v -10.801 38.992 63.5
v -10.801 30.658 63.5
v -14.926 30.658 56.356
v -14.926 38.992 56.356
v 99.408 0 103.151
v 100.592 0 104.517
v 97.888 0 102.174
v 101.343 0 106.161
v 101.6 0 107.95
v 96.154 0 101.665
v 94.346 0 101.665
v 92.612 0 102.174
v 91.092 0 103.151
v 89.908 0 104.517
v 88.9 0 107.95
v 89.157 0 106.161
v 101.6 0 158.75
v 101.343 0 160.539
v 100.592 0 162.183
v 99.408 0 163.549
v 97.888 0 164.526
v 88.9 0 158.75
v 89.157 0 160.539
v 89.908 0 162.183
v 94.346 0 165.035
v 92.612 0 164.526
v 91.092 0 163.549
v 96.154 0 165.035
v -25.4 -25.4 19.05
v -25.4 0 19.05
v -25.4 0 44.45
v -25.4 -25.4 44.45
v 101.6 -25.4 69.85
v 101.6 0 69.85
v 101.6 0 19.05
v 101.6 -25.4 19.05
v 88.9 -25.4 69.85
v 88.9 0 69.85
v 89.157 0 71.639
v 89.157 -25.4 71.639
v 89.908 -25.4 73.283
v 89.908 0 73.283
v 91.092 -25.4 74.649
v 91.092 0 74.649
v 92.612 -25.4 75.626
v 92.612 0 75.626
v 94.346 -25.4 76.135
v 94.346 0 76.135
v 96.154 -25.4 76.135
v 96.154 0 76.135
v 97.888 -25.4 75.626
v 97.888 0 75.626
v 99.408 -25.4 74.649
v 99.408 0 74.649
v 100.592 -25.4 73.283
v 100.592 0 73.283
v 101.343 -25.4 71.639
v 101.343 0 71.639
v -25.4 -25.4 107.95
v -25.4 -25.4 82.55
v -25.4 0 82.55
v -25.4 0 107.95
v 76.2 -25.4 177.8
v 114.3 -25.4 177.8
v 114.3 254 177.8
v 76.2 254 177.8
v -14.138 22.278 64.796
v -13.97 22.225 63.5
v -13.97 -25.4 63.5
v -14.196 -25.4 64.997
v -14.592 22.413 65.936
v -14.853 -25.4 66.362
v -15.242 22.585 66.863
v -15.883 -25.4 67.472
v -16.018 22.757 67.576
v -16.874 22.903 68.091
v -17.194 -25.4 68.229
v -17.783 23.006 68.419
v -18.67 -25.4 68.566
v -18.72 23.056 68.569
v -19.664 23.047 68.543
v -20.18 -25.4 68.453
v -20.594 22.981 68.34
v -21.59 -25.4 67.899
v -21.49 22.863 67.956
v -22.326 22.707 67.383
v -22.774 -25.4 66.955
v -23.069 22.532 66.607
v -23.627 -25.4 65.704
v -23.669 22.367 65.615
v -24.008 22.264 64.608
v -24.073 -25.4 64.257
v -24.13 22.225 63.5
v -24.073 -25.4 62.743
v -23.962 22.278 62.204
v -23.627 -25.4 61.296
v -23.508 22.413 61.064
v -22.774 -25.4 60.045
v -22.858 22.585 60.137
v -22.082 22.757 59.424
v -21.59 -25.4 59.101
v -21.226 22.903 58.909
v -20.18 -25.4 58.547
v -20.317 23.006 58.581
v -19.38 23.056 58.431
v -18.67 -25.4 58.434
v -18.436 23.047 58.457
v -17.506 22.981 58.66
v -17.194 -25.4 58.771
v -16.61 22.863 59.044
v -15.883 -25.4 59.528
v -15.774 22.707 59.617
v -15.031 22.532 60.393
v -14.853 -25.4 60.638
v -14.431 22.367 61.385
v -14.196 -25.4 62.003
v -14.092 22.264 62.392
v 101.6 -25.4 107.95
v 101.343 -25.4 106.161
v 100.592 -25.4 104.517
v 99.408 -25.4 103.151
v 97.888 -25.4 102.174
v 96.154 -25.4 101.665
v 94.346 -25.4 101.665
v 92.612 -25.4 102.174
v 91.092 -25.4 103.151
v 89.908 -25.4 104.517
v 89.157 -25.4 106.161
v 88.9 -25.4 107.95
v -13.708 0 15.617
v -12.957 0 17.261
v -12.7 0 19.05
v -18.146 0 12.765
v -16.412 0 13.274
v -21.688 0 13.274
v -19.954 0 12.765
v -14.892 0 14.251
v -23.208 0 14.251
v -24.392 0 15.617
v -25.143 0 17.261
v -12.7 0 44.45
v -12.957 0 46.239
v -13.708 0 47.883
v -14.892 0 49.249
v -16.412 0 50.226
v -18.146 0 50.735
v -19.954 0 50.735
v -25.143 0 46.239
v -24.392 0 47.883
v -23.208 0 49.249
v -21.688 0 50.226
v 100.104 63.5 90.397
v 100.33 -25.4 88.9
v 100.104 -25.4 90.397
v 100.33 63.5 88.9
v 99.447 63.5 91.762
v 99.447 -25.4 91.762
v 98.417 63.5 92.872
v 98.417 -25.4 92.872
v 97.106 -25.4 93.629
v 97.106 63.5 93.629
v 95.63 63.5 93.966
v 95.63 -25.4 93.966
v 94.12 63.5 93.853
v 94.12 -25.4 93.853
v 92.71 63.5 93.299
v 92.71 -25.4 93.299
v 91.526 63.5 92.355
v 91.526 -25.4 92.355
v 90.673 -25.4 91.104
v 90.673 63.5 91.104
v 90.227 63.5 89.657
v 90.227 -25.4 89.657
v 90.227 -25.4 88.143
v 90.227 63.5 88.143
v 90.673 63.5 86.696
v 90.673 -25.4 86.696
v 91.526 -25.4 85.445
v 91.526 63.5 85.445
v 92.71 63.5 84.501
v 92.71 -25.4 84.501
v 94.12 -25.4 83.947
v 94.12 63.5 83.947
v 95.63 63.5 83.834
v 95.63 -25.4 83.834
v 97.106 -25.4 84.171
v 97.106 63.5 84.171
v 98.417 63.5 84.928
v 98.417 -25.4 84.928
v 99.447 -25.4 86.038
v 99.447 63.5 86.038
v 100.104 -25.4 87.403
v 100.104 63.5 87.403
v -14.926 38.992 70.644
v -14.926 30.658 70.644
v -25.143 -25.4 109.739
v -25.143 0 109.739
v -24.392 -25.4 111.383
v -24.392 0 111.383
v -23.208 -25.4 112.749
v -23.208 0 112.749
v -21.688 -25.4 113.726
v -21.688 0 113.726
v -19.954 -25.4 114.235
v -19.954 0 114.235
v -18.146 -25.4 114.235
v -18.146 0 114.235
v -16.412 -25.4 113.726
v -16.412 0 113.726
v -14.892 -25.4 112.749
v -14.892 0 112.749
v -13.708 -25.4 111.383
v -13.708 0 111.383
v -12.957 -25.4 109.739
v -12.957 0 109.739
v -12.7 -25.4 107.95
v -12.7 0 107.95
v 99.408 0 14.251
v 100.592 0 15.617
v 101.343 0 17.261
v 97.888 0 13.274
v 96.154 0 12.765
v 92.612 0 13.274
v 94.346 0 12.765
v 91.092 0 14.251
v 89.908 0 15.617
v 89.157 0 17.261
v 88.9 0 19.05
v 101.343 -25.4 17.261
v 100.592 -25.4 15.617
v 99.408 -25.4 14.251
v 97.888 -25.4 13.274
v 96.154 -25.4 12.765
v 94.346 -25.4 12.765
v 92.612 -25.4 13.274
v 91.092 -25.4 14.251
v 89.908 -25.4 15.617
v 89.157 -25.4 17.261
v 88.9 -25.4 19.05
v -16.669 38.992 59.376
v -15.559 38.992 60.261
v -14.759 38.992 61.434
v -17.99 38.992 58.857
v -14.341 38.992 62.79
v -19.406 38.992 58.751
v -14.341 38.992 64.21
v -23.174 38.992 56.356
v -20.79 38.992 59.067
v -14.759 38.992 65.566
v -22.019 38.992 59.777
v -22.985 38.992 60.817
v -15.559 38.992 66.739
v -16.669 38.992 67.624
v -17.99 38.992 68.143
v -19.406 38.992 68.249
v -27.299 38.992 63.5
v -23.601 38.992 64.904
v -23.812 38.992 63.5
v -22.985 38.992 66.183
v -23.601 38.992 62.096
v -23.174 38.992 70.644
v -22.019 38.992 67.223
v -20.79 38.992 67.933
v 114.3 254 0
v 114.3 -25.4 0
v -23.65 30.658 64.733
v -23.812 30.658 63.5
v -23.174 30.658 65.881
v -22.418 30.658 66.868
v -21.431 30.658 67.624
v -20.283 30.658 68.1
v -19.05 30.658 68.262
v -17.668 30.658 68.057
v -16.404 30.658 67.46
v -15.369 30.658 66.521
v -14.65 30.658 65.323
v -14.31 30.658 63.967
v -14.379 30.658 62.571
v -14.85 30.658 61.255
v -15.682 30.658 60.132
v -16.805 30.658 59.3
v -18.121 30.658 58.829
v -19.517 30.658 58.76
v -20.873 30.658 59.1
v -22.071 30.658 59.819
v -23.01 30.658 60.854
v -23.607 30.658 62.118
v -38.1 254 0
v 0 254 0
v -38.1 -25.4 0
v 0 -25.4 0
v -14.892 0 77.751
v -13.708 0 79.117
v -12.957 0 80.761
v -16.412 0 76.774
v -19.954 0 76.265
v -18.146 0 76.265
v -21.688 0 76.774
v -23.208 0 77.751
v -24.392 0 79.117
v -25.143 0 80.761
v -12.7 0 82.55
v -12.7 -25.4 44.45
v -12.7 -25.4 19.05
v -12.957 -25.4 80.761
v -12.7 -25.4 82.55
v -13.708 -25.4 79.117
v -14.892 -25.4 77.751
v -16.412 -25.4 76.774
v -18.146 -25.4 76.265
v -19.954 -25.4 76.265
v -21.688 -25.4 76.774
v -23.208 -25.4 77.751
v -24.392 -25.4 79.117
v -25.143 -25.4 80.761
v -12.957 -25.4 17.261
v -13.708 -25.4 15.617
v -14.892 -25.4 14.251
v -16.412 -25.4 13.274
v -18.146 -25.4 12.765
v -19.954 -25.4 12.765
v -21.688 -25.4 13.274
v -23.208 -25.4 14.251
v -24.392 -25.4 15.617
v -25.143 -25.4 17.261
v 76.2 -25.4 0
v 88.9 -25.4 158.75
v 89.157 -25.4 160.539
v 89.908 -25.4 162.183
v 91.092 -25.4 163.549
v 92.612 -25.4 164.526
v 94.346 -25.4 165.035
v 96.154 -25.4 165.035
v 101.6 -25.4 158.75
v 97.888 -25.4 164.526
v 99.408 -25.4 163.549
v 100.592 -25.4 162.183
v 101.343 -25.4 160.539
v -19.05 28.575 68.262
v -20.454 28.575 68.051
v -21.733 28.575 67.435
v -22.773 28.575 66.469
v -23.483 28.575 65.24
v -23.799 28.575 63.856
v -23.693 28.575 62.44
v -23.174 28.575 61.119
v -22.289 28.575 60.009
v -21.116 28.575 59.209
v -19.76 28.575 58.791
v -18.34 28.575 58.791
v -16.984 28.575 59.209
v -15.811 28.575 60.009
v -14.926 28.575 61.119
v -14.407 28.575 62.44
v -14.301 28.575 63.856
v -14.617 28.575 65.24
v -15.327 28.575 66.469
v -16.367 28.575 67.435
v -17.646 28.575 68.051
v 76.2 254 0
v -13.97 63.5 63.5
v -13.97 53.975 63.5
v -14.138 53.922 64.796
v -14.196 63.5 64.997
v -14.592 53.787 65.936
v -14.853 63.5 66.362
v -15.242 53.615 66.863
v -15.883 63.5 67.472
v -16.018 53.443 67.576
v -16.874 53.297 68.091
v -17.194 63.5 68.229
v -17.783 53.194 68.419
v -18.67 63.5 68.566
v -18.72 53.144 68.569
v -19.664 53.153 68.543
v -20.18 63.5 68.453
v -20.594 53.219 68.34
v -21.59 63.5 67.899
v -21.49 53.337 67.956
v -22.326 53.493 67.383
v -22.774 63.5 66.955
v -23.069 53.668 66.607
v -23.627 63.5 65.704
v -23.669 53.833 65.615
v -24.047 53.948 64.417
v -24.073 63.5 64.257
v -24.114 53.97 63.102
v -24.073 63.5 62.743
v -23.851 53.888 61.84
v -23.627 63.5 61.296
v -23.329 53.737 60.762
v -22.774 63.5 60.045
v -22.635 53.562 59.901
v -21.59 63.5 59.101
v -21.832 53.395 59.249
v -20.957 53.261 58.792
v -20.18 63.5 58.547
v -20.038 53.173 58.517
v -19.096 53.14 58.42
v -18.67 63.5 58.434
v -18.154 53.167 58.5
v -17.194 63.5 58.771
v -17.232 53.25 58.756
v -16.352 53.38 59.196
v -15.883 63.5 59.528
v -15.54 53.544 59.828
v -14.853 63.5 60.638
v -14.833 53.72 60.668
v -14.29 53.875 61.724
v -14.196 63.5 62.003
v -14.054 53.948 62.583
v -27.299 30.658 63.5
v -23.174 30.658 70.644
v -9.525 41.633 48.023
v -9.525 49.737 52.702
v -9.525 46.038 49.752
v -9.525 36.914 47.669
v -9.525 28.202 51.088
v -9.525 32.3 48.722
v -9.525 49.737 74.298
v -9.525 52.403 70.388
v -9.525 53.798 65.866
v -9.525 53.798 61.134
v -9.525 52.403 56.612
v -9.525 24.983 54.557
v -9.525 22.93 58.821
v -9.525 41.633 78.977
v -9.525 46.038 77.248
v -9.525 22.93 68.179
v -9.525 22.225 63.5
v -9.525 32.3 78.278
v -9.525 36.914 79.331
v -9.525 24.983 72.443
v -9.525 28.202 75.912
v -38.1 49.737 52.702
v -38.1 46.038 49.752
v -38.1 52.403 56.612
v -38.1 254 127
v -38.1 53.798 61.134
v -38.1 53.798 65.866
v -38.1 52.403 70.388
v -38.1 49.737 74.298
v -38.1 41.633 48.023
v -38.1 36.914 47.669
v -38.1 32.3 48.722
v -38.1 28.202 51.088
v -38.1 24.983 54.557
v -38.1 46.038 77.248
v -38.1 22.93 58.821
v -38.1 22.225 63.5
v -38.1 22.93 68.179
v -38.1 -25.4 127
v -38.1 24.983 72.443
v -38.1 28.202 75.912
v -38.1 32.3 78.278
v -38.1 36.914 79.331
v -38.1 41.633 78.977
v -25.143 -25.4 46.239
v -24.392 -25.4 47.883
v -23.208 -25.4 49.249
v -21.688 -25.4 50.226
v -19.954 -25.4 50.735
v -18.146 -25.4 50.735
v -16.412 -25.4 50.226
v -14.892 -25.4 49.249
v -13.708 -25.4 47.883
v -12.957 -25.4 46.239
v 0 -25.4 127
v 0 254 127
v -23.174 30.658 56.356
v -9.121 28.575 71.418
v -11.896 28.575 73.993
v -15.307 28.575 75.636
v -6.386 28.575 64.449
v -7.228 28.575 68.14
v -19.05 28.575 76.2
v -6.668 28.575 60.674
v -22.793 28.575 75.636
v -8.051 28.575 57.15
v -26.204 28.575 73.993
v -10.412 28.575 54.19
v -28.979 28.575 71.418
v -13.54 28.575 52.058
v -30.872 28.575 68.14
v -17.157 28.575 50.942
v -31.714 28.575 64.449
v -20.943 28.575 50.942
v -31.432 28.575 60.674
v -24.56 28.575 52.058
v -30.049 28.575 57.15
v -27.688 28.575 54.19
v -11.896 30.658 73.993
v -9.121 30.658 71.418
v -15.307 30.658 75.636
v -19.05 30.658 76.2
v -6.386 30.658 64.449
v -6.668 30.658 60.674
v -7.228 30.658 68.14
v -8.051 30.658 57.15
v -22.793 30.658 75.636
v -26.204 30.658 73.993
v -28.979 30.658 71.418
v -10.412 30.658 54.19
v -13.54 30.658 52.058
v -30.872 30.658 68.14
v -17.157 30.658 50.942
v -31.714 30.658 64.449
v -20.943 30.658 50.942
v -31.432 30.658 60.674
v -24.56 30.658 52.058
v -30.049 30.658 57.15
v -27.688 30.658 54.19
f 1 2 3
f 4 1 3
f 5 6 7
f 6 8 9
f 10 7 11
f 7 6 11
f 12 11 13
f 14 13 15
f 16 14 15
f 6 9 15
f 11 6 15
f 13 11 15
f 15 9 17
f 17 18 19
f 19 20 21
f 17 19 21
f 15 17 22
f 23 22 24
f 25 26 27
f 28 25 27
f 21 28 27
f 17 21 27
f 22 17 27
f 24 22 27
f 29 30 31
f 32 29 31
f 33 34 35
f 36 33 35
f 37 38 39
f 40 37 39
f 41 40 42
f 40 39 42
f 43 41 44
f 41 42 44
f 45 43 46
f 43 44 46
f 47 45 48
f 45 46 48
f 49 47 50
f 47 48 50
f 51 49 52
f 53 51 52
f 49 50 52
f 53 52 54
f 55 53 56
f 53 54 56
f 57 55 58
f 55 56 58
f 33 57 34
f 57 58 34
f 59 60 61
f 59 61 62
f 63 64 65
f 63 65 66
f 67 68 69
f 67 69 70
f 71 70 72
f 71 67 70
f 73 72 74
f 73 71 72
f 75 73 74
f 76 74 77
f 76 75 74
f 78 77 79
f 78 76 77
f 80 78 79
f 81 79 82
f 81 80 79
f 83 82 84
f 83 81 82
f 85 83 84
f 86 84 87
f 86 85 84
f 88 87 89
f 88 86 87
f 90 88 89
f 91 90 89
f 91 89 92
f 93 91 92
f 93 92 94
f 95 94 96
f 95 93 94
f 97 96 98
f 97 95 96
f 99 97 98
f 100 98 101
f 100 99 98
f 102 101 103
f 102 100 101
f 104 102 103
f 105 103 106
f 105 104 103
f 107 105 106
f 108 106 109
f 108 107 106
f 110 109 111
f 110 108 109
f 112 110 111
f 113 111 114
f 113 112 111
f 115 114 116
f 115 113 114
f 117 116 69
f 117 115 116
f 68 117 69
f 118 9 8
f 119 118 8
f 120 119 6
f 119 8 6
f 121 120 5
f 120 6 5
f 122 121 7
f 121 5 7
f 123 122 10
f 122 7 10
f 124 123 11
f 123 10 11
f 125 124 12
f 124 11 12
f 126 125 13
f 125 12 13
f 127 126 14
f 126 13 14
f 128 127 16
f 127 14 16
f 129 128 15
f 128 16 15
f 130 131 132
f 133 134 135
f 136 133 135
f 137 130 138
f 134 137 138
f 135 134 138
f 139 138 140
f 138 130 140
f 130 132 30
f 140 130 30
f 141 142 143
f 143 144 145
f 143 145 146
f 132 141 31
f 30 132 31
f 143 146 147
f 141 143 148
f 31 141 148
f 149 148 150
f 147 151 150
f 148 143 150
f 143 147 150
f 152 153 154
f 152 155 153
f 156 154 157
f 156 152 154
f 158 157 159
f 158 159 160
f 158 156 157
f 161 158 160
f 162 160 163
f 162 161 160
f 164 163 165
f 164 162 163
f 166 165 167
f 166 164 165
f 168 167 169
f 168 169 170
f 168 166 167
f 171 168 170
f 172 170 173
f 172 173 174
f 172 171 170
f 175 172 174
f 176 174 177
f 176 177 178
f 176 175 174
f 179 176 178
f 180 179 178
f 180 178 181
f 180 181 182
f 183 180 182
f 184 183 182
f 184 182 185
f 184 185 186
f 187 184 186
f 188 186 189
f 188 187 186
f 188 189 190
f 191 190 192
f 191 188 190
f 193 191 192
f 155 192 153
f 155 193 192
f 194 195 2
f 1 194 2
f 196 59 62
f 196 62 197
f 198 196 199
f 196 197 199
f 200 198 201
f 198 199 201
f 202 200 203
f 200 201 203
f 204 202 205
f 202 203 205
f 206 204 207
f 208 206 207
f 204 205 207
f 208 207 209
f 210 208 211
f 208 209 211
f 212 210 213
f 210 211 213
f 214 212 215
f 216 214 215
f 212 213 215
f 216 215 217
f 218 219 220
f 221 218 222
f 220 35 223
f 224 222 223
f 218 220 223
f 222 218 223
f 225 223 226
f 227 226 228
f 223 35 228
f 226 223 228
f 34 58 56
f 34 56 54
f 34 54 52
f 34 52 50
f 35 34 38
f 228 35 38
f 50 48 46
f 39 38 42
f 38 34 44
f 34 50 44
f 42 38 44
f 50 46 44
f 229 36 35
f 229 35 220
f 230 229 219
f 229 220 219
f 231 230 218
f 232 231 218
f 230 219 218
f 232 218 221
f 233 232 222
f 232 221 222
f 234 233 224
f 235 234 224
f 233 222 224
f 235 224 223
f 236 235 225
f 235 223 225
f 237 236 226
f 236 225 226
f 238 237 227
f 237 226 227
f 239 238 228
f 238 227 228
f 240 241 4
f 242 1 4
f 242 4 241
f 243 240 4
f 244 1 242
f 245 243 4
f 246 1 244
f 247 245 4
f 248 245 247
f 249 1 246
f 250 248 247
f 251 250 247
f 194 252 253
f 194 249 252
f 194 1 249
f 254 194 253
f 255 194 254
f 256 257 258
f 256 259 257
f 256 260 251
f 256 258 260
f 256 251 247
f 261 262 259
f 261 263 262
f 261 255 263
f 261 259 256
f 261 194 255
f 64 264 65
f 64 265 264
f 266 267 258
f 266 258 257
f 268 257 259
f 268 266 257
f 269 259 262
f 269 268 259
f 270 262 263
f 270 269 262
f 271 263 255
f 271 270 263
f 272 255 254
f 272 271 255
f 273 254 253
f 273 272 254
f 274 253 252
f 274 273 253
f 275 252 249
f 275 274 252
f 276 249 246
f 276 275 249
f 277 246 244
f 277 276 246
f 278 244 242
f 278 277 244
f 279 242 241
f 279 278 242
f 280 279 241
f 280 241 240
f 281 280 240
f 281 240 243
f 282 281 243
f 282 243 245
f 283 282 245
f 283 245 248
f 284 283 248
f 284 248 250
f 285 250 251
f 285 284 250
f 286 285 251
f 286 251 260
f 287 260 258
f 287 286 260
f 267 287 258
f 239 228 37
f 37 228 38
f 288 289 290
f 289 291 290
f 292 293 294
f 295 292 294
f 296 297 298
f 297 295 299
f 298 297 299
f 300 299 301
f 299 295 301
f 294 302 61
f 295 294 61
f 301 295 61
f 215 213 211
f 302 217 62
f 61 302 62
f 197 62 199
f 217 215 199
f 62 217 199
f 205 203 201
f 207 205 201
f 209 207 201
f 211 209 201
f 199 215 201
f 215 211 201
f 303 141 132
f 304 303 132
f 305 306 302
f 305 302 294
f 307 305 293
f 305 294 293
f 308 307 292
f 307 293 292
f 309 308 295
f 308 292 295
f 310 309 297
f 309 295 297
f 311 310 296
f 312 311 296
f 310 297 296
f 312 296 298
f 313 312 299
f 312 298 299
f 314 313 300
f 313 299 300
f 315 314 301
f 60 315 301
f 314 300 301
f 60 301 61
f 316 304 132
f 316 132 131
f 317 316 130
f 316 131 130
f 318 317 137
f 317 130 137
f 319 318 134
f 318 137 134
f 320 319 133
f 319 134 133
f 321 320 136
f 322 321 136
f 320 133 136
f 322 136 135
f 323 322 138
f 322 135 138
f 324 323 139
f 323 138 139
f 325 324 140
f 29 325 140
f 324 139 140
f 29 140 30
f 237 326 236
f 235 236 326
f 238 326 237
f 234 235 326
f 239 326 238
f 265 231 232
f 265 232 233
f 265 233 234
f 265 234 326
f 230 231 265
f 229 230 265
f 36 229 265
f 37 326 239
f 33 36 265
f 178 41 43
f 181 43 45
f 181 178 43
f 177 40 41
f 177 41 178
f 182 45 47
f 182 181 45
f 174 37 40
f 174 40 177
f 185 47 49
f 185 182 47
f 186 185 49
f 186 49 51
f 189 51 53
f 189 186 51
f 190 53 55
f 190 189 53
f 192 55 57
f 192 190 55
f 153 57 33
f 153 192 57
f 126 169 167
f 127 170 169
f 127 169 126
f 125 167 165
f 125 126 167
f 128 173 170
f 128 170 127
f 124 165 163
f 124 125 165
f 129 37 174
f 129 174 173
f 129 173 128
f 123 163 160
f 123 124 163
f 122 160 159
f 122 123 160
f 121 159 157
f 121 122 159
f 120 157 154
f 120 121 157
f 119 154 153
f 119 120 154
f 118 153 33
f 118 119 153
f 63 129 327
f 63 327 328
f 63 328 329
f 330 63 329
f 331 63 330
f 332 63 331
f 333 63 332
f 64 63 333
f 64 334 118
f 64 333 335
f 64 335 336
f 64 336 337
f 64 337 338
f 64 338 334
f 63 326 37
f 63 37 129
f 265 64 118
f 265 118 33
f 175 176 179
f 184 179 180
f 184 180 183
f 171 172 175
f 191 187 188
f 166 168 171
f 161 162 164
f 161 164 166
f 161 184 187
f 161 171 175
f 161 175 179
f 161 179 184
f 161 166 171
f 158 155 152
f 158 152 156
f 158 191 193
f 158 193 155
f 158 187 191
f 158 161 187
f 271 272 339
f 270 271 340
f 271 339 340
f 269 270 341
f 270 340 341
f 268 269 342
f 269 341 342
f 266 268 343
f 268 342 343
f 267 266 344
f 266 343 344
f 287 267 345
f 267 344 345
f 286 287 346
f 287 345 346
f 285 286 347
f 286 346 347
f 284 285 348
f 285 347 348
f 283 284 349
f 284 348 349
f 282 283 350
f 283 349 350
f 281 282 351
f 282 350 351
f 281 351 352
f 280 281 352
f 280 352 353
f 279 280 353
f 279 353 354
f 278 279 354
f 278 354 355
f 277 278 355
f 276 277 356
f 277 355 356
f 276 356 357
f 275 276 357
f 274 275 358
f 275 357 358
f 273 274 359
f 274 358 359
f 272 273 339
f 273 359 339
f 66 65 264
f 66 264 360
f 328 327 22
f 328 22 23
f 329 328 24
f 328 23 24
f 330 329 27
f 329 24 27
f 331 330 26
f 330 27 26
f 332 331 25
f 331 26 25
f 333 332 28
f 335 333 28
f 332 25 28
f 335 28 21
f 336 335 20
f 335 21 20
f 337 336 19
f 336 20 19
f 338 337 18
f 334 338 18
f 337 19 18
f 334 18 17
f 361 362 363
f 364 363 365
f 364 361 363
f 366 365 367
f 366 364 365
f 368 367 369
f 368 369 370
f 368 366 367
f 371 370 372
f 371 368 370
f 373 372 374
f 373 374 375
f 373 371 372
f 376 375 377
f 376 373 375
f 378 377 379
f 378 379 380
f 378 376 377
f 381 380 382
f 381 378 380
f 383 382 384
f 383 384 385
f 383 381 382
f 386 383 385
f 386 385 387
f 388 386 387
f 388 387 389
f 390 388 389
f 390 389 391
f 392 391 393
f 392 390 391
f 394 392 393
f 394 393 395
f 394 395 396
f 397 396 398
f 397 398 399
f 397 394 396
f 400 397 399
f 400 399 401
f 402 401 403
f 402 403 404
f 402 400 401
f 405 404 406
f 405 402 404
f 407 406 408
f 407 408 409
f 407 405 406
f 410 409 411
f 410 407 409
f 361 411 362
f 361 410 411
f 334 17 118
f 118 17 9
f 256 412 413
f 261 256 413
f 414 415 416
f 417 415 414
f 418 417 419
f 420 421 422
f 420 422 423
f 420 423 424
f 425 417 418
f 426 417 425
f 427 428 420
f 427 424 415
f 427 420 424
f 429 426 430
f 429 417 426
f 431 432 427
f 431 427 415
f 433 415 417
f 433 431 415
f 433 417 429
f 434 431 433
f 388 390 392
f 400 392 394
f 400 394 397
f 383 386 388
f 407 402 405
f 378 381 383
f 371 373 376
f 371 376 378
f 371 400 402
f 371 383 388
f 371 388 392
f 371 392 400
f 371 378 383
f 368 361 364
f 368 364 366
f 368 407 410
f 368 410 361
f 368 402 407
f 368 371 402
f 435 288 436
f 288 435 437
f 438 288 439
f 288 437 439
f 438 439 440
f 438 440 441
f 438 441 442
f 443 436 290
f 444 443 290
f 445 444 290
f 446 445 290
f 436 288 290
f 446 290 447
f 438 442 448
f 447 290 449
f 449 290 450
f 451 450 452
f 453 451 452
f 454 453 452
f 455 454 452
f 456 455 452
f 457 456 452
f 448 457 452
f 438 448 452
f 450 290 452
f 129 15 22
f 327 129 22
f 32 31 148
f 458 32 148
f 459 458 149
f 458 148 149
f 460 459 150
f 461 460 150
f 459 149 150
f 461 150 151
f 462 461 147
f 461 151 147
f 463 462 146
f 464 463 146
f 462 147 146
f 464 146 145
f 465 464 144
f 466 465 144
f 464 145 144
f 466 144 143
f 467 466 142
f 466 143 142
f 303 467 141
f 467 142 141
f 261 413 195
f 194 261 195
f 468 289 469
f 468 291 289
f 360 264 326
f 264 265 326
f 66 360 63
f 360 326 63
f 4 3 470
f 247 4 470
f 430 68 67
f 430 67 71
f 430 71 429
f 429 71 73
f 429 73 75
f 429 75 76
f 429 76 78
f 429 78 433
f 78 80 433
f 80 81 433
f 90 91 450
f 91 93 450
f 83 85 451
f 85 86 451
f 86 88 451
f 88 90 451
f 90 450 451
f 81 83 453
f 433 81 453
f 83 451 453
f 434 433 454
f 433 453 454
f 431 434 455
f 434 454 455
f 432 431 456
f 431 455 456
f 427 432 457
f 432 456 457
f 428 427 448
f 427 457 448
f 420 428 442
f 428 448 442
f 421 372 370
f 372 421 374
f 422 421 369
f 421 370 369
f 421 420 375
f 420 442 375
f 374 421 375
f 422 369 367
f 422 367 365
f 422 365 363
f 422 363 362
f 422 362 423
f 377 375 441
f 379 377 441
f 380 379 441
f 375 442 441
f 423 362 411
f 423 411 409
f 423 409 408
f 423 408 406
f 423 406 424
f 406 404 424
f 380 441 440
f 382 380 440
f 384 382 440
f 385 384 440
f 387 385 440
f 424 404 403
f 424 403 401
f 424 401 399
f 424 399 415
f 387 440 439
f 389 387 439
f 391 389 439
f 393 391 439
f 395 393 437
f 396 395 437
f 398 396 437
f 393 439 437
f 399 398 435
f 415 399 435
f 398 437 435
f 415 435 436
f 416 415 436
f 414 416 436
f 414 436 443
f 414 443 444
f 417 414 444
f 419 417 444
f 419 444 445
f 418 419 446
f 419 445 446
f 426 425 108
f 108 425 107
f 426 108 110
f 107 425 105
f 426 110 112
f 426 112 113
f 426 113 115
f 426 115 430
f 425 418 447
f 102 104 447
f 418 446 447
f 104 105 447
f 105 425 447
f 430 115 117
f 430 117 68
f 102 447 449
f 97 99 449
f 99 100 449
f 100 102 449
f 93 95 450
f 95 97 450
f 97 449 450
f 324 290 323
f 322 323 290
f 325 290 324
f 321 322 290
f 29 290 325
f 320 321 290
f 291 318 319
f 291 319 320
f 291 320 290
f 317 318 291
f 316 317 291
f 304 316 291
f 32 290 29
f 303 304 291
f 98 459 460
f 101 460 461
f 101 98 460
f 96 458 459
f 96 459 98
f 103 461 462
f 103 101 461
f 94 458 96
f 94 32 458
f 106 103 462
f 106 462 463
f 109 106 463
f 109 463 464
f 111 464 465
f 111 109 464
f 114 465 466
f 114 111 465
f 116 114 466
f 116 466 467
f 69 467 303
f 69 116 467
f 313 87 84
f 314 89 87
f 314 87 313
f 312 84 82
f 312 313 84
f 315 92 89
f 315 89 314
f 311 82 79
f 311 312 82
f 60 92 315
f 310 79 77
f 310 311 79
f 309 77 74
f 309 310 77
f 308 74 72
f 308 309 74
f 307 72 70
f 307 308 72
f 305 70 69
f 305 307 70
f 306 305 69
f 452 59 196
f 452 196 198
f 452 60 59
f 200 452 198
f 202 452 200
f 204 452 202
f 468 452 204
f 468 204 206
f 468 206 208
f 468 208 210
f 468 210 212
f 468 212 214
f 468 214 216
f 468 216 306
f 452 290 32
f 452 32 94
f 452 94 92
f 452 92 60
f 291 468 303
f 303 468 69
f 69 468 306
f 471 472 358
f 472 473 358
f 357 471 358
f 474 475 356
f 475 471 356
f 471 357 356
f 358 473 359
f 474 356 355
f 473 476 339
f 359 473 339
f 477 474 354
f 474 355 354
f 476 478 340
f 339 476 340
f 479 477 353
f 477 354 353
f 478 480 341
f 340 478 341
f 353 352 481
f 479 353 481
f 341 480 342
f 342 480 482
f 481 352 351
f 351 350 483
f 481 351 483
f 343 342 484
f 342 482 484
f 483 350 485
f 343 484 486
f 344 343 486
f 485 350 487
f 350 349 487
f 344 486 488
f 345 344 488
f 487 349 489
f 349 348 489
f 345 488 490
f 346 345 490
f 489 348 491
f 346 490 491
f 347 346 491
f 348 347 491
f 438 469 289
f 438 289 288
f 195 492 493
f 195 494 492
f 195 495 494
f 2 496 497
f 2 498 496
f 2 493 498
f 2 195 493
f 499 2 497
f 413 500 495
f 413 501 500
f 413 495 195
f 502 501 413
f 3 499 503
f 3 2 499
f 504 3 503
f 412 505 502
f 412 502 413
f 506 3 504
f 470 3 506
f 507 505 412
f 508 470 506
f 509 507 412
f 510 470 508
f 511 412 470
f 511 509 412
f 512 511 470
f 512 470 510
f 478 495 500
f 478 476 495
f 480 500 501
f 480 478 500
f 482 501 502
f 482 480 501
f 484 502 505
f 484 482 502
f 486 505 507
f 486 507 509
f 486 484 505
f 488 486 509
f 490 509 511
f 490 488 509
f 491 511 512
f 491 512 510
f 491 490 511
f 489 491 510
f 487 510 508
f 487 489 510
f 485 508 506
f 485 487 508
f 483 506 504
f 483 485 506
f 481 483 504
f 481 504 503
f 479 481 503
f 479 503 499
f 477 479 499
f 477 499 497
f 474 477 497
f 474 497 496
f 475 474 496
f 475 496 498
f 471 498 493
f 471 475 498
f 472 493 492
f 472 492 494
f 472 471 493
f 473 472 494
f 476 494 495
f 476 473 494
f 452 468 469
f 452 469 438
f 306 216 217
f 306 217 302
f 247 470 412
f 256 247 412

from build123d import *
from build123d import SkipClean  # not in build123d's __all__

# Parameters (mm, degrees)
F0_W      = 38.1
F0_H      = 127
F0_R      = 5.08
F1_DEPTH  = 25.4
F0_H_2    = 177.8
F2_W      = 38.1
F2_H      = 177.8
F3_DEPTH  = 254
F2_H_2    = 127
F4_R      = 5.08
F5_DEPTH  = 63.5
F6_R      = 15.875
F7_DEPTH  = 28.575
F10_W     = 2.0828
F10_H     = 7.9375
F12_R     = 4.7625
F13_DEPTH = 8.334375


with BuildPart() as f1:
    # F0 (on Front) → F1 (new body)
    with BuildSketch(Plane.XZ):
        with Locations((-19.05, 63.5)):
            Rectangle(F0_W, F0_H)
        with BuildLine():
            Line((-25.4, 19.05), (-25.4, 44.45))
            ThreePointArc((-25.4, 44.45), (-19.05, 50.8), (-12.7, 44.45))
            Line((-12.7, 44.45), (-12.7, 19.05))
            ThreePointArc((-12.7, 19.05), (-19.05, 12.7), (-25.4, 19.05))
        make_face(mode=Mode.SUBTRACT)
        with Locations((-19.05, 63.5)):
            Circle(F0_R, mode=Mode.SUBTRACT)
        with BuildLine():
            Line((-12.7, 107.95), (-12.7, 82.55))
            ThreePointArc((-12.7, 82.55), (-19.05, 76.2), (-25.4, 82.55))
            Line((-25.4, 82.55), (-25.4, 107.95))
            ThreePointArc((-25.4, 107.95), (-19.05, 114.3), (-12.7, 107.95))
        make_face(mode=Mode.SUBTRACT)
    extrude(amount=F1_DEPTH)

    # F2 (on face) → F3, piece 2 (join)
    with BuildSketch(Plane(origin=(0, 0, 0), x_dir=(-1, 0, 0), z_dir=(0, 1, 0))):
        with Locations((19.05, 63.5)):
            Rectangle(F2_W, F2_H_2)
    extrude(amount=F3_DEPTH)


with BuildPart() as f1b:
    # F0 (on Front) → F1, piece 2 (new body)
    with BuildSketch(Plane.XZ):
        with Locations((95.25, 88.9)):
            Rectangle(F0_W, F0_H_2)
        with BuildLine():
            Line((101.6, 69.85), (101.6, 19.05))
            ThreePointArc((101.6, 19.05), (95.25, 12.7), (88.9, 19.05))
            Line((88.9, 19.05), (88.9, 69.85))
            ThreePointArc((88.9, 69.85), (95.25, 76.2), (101.6, 69.85))
        make_face(mode=Mode.SUBTRACT)
        with Locations((95.25, 88.9)):
            Circle(F0_R, mode=Mode.SUBTRACT)
        with BuildLine():
            ThreePointArc((101.6, 107.95), (95.25, 101.6), (88.9, 107.95))
            Line((88.9, 107.95), (88.9, 158.75))
            ThreePointArc((88.9, 158.75), (95.25, 165.1), (101.6, 158.75))
            Line((101.6, 158.75), (101.6, 107.95))
        make_face(mode=Mode.SUBTRACT)
    extrude(amount=F1_DEPTH)

    # F2 (on face) → F3 (join)
    with BuildSketch(Plane(origin=(0, 0, 0), x_dir=(-1, 0, 0), z_dir=(0, 1, 0))):
        with Locations((-95.25, 88.9)):
            Rectangle(F2_W, F2_H)
    extrude(amount=F3_DEPTH)


with BuildPart() as f5_tool:
    # F4 (on face) → F5 (new body)
    with BuildSketch(Plane.XZ):
        with Locations((-19.05, 63.5)):
            Circle(F4_R)
        with Locations((95.25, 88.9)):
            Circle(F4_R)
    extrude(amount=-F5_DEPTH)


with BuildPart() as f1_1:
    add(f1.part, clean=False)

    # F5: cut by f5_tool
    add(f5_tool.part, mode=Mode.SUBTRACT)

    # F6 (on face) → F7 (cut)
    with BuildSketch(Plane(origin=(-38.1, 0, 0), x_dir=(0, -1, 0), z_dir=(-1, 0, 0))):
        with Locations((-38.1, 63.5)):
            Circle(F6_R)
    extrude(amount=-F7_DEPTH, mode=Mode.SUBTRACT)


with BuildPart() as f1b_1:
    add(f1b.part, clean=False)

    # F5: cut by f5_tool
    add(f5_tool.part, mode=Mode.SUBTRACT)


with BuildPart() as f11:
    # F10 (on plane+point) → F11 (revolve)
    with BuildSketch(Plane(origin=(-19.05, 0, 0), x_dir=(0, -1, 0), z_dir=(-1, 0, 0))):
        with Locations((-29.6164, 72.23125)):
            Rectangle(F10_W, F10_H)
    revolve(axis=Axis((-19.05, 9.597724928, 63.5), (0, -1, 0)))

    # F12 (on face) → F13 (join)
    with BuildSketch(Plane(origin=(0, 30.6578, 0), x_dir=(-1, 0, 0), z_dir=(0, 1, 0))):
        Polygon((27.298891971, 63.5), (23.1744459855, 70.64375), (14.9255540145, 70.64375), (10.801108029, 63.5), (14.9255540145, 56.35625), (23.1744459855, 56.35625), align=None)
        with Locations((19.05, 63.5)):
            Circle(F12_R, mode=Mode.SUBTRACT)
    with SkipClean():  # cleaning this boolean's faces spoils the solid; the shape is the same uncleaned
        extrude(amount=F13_DEPTH)


solid = Compound([f1_1.part, f1b_1.part, f11.part])
